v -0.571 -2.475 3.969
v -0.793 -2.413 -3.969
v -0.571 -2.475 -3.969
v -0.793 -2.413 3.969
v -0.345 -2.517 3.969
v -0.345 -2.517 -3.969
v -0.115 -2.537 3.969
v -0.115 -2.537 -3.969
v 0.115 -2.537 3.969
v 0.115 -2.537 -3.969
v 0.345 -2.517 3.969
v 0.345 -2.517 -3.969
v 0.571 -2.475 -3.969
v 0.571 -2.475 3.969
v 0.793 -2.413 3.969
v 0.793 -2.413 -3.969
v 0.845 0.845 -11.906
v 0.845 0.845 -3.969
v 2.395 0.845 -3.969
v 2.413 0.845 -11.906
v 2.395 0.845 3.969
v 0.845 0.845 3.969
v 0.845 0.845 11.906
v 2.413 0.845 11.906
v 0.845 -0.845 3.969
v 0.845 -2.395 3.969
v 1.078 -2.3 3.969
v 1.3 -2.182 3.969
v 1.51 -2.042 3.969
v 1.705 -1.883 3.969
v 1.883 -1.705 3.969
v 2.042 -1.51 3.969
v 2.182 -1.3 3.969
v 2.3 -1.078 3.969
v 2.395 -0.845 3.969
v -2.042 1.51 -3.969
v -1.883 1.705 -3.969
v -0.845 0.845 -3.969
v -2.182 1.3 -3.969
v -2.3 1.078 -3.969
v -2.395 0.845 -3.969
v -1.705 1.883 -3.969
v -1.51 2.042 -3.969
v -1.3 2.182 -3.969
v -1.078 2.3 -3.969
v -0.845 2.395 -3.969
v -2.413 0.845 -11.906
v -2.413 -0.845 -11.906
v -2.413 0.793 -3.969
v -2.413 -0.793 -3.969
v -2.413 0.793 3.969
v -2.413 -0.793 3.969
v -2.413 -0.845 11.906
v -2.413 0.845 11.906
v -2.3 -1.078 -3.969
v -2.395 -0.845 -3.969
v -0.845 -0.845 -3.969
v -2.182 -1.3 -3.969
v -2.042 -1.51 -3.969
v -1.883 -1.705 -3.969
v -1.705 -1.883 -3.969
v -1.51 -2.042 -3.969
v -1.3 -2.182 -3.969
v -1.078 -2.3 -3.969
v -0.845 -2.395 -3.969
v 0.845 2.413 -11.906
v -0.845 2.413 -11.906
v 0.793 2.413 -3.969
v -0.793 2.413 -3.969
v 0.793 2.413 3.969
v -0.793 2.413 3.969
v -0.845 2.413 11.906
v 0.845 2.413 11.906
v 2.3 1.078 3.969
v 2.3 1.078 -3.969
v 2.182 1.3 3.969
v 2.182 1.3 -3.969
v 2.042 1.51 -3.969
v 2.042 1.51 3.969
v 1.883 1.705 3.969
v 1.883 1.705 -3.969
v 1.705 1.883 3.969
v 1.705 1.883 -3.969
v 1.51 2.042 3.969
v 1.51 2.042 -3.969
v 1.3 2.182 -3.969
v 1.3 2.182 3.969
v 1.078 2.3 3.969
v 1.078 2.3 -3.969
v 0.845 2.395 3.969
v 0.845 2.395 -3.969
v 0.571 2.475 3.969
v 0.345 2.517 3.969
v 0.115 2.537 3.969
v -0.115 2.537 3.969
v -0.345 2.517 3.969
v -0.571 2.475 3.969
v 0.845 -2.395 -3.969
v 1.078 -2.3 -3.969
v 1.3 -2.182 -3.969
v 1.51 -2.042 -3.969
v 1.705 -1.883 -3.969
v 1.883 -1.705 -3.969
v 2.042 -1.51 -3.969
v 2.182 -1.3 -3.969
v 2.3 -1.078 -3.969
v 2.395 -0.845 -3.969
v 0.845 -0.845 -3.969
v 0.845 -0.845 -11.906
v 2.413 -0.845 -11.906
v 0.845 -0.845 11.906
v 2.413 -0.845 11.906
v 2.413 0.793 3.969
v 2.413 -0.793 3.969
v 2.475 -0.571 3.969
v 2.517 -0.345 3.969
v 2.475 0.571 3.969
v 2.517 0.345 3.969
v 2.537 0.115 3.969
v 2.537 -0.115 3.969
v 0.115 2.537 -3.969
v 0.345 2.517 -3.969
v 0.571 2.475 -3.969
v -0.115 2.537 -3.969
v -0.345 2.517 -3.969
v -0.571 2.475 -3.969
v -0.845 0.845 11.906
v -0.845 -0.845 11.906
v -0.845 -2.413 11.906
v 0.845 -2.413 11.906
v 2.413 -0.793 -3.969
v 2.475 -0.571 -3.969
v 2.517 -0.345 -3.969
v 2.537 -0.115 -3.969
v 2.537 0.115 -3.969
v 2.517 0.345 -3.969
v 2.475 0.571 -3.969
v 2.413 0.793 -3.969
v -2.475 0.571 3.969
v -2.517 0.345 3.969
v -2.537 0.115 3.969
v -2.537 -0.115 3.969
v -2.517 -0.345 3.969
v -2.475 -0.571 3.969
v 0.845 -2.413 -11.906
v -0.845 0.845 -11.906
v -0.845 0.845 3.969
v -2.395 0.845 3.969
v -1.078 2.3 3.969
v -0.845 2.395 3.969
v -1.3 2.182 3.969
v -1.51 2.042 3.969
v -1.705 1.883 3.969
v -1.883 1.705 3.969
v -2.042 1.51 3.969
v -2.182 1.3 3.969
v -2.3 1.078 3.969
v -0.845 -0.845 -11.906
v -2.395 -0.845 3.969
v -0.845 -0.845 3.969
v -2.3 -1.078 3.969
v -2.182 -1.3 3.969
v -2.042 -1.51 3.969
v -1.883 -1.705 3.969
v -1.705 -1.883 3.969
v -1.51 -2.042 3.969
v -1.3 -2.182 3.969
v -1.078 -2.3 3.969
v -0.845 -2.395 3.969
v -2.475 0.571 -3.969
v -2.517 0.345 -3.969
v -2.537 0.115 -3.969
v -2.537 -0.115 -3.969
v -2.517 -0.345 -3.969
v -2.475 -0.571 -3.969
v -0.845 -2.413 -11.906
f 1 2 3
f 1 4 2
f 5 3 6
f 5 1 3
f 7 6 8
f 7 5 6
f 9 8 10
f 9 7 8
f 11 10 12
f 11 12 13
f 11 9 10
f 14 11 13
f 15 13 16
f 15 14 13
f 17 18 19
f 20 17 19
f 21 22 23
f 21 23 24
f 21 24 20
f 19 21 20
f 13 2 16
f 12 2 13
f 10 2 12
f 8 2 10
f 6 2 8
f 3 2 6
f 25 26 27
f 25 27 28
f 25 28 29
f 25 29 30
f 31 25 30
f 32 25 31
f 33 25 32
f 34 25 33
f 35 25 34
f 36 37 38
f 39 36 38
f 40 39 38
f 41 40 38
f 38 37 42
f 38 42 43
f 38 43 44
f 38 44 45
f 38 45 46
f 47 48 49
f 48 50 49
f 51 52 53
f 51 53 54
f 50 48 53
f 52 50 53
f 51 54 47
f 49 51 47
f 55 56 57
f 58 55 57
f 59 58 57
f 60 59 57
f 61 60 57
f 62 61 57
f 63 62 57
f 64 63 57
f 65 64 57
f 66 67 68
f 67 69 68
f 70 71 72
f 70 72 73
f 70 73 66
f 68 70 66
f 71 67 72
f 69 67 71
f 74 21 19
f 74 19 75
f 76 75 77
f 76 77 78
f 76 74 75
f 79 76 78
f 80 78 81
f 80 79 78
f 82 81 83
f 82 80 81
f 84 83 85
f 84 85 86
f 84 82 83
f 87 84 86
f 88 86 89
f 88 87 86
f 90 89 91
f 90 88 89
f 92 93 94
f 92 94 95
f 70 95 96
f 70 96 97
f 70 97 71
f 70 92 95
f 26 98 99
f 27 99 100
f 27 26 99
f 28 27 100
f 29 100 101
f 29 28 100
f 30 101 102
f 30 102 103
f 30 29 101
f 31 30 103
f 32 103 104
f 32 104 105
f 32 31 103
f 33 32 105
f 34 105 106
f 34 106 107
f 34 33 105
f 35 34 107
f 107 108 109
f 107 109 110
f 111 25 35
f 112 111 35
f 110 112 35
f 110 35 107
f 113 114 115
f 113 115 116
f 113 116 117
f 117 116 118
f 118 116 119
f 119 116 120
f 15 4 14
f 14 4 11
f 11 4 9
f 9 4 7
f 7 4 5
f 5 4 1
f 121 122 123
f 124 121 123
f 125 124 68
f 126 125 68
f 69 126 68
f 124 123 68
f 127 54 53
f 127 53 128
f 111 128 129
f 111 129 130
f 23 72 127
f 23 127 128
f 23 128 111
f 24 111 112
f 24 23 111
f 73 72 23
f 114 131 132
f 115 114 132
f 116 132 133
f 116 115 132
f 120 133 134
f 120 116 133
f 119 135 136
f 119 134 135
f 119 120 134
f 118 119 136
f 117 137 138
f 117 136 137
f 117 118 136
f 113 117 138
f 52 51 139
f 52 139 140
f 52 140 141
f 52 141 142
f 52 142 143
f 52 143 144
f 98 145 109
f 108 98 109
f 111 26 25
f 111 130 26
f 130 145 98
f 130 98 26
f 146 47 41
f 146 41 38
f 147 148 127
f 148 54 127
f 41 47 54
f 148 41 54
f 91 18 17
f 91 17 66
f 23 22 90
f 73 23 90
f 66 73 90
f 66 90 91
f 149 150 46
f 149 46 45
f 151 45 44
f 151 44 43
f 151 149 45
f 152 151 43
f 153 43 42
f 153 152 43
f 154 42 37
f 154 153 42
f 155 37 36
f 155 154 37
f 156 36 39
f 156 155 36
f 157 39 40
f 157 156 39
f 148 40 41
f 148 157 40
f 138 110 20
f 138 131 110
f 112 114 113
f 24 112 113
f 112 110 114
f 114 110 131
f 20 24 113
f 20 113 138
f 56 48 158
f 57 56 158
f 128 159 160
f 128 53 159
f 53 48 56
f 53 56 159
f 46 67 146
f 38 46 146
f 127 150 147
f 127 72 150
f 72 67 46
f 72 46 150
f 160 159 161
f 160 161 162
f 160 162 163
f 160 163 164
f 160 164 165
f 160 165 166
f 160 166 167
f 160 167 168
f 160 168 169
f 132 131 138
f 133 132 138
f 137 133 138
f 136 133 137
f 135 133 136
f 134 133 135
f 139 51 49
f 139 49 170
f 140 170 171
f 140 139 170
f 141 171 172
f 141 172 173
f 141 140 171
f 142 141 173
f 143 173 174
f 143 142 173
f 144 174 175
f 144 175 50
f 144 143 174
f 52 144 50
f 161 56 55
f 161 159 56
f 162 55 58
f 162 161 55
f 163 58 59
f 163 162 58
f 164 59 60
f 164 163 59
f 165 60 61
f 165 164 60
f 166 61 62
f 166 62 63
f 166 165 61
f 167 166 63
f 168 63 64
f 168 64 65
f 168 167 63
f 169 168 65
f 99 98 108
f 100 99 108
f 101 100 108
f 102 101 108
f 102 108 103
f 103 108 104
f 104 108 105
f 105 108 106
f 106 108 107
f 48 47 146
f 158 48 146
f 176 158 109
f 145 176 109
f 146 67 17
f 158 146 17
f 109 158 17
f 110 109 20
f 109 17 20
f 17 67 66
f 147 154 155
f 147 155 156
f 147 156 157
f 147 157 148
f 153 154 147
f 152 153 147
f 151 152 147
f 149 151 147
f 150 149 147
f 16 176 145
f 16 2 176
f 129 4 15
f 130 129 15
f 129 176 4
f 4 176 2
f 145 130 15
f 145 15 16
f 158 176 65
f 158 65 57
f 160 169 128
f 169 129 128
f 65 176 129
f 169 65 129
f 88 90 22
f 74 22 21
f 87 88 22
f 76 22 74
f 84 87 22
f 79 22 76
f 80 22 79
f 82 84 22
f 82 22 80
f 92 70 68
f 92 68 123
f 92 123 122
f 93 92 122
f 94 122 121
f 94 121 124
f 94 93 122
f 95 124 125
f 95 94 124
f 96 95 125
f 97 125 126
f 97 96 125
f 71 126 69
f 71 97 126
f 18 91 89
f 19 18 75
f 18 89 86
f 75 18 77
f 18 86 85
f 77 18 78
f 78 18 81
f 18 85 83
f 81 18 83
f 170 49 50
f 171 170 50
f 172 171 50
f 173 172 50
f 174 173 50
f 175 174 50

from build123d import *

# Parameters (mm, degrees)
F0_R     = 2.54
F1_DEPTH = 3.96875
F2_W     = 1.6891
F2_H     = 1.56845
F2_W_2   = 1.56845
F2_H_2   = 1.6891
F3_DEPTH = 11.90625


with BuildPart() as f1:
    # F0 (on Top) → F1 (new body, symmetric)
    with BuildSketch(Plane.XY):
        Circle(F0_R)
    extrude(amount=F1_DEPTH, both=True)

    # F2 (on Top) → F3 (join, symmetric)
    with BuildSketch(Plane.XY):
        with Locations((0, 1.628775)):
            Rectangle(F2_W, F2_H)
        with Locations((1.628775, 0)):
            Rectangle(F2_W_2, F2_H_2)
        Rectangle(F2_W, F2_H_2)
        with Locations((-1.628775, 0)):
            Rectangle(F2_W_2, F2_H_2)
        with Locations((0, -1.628775)):
            Rectangle(F2_W, F2_H)
    extrude(amount=F3_DEPTH, both=True)


solid = f1.part
